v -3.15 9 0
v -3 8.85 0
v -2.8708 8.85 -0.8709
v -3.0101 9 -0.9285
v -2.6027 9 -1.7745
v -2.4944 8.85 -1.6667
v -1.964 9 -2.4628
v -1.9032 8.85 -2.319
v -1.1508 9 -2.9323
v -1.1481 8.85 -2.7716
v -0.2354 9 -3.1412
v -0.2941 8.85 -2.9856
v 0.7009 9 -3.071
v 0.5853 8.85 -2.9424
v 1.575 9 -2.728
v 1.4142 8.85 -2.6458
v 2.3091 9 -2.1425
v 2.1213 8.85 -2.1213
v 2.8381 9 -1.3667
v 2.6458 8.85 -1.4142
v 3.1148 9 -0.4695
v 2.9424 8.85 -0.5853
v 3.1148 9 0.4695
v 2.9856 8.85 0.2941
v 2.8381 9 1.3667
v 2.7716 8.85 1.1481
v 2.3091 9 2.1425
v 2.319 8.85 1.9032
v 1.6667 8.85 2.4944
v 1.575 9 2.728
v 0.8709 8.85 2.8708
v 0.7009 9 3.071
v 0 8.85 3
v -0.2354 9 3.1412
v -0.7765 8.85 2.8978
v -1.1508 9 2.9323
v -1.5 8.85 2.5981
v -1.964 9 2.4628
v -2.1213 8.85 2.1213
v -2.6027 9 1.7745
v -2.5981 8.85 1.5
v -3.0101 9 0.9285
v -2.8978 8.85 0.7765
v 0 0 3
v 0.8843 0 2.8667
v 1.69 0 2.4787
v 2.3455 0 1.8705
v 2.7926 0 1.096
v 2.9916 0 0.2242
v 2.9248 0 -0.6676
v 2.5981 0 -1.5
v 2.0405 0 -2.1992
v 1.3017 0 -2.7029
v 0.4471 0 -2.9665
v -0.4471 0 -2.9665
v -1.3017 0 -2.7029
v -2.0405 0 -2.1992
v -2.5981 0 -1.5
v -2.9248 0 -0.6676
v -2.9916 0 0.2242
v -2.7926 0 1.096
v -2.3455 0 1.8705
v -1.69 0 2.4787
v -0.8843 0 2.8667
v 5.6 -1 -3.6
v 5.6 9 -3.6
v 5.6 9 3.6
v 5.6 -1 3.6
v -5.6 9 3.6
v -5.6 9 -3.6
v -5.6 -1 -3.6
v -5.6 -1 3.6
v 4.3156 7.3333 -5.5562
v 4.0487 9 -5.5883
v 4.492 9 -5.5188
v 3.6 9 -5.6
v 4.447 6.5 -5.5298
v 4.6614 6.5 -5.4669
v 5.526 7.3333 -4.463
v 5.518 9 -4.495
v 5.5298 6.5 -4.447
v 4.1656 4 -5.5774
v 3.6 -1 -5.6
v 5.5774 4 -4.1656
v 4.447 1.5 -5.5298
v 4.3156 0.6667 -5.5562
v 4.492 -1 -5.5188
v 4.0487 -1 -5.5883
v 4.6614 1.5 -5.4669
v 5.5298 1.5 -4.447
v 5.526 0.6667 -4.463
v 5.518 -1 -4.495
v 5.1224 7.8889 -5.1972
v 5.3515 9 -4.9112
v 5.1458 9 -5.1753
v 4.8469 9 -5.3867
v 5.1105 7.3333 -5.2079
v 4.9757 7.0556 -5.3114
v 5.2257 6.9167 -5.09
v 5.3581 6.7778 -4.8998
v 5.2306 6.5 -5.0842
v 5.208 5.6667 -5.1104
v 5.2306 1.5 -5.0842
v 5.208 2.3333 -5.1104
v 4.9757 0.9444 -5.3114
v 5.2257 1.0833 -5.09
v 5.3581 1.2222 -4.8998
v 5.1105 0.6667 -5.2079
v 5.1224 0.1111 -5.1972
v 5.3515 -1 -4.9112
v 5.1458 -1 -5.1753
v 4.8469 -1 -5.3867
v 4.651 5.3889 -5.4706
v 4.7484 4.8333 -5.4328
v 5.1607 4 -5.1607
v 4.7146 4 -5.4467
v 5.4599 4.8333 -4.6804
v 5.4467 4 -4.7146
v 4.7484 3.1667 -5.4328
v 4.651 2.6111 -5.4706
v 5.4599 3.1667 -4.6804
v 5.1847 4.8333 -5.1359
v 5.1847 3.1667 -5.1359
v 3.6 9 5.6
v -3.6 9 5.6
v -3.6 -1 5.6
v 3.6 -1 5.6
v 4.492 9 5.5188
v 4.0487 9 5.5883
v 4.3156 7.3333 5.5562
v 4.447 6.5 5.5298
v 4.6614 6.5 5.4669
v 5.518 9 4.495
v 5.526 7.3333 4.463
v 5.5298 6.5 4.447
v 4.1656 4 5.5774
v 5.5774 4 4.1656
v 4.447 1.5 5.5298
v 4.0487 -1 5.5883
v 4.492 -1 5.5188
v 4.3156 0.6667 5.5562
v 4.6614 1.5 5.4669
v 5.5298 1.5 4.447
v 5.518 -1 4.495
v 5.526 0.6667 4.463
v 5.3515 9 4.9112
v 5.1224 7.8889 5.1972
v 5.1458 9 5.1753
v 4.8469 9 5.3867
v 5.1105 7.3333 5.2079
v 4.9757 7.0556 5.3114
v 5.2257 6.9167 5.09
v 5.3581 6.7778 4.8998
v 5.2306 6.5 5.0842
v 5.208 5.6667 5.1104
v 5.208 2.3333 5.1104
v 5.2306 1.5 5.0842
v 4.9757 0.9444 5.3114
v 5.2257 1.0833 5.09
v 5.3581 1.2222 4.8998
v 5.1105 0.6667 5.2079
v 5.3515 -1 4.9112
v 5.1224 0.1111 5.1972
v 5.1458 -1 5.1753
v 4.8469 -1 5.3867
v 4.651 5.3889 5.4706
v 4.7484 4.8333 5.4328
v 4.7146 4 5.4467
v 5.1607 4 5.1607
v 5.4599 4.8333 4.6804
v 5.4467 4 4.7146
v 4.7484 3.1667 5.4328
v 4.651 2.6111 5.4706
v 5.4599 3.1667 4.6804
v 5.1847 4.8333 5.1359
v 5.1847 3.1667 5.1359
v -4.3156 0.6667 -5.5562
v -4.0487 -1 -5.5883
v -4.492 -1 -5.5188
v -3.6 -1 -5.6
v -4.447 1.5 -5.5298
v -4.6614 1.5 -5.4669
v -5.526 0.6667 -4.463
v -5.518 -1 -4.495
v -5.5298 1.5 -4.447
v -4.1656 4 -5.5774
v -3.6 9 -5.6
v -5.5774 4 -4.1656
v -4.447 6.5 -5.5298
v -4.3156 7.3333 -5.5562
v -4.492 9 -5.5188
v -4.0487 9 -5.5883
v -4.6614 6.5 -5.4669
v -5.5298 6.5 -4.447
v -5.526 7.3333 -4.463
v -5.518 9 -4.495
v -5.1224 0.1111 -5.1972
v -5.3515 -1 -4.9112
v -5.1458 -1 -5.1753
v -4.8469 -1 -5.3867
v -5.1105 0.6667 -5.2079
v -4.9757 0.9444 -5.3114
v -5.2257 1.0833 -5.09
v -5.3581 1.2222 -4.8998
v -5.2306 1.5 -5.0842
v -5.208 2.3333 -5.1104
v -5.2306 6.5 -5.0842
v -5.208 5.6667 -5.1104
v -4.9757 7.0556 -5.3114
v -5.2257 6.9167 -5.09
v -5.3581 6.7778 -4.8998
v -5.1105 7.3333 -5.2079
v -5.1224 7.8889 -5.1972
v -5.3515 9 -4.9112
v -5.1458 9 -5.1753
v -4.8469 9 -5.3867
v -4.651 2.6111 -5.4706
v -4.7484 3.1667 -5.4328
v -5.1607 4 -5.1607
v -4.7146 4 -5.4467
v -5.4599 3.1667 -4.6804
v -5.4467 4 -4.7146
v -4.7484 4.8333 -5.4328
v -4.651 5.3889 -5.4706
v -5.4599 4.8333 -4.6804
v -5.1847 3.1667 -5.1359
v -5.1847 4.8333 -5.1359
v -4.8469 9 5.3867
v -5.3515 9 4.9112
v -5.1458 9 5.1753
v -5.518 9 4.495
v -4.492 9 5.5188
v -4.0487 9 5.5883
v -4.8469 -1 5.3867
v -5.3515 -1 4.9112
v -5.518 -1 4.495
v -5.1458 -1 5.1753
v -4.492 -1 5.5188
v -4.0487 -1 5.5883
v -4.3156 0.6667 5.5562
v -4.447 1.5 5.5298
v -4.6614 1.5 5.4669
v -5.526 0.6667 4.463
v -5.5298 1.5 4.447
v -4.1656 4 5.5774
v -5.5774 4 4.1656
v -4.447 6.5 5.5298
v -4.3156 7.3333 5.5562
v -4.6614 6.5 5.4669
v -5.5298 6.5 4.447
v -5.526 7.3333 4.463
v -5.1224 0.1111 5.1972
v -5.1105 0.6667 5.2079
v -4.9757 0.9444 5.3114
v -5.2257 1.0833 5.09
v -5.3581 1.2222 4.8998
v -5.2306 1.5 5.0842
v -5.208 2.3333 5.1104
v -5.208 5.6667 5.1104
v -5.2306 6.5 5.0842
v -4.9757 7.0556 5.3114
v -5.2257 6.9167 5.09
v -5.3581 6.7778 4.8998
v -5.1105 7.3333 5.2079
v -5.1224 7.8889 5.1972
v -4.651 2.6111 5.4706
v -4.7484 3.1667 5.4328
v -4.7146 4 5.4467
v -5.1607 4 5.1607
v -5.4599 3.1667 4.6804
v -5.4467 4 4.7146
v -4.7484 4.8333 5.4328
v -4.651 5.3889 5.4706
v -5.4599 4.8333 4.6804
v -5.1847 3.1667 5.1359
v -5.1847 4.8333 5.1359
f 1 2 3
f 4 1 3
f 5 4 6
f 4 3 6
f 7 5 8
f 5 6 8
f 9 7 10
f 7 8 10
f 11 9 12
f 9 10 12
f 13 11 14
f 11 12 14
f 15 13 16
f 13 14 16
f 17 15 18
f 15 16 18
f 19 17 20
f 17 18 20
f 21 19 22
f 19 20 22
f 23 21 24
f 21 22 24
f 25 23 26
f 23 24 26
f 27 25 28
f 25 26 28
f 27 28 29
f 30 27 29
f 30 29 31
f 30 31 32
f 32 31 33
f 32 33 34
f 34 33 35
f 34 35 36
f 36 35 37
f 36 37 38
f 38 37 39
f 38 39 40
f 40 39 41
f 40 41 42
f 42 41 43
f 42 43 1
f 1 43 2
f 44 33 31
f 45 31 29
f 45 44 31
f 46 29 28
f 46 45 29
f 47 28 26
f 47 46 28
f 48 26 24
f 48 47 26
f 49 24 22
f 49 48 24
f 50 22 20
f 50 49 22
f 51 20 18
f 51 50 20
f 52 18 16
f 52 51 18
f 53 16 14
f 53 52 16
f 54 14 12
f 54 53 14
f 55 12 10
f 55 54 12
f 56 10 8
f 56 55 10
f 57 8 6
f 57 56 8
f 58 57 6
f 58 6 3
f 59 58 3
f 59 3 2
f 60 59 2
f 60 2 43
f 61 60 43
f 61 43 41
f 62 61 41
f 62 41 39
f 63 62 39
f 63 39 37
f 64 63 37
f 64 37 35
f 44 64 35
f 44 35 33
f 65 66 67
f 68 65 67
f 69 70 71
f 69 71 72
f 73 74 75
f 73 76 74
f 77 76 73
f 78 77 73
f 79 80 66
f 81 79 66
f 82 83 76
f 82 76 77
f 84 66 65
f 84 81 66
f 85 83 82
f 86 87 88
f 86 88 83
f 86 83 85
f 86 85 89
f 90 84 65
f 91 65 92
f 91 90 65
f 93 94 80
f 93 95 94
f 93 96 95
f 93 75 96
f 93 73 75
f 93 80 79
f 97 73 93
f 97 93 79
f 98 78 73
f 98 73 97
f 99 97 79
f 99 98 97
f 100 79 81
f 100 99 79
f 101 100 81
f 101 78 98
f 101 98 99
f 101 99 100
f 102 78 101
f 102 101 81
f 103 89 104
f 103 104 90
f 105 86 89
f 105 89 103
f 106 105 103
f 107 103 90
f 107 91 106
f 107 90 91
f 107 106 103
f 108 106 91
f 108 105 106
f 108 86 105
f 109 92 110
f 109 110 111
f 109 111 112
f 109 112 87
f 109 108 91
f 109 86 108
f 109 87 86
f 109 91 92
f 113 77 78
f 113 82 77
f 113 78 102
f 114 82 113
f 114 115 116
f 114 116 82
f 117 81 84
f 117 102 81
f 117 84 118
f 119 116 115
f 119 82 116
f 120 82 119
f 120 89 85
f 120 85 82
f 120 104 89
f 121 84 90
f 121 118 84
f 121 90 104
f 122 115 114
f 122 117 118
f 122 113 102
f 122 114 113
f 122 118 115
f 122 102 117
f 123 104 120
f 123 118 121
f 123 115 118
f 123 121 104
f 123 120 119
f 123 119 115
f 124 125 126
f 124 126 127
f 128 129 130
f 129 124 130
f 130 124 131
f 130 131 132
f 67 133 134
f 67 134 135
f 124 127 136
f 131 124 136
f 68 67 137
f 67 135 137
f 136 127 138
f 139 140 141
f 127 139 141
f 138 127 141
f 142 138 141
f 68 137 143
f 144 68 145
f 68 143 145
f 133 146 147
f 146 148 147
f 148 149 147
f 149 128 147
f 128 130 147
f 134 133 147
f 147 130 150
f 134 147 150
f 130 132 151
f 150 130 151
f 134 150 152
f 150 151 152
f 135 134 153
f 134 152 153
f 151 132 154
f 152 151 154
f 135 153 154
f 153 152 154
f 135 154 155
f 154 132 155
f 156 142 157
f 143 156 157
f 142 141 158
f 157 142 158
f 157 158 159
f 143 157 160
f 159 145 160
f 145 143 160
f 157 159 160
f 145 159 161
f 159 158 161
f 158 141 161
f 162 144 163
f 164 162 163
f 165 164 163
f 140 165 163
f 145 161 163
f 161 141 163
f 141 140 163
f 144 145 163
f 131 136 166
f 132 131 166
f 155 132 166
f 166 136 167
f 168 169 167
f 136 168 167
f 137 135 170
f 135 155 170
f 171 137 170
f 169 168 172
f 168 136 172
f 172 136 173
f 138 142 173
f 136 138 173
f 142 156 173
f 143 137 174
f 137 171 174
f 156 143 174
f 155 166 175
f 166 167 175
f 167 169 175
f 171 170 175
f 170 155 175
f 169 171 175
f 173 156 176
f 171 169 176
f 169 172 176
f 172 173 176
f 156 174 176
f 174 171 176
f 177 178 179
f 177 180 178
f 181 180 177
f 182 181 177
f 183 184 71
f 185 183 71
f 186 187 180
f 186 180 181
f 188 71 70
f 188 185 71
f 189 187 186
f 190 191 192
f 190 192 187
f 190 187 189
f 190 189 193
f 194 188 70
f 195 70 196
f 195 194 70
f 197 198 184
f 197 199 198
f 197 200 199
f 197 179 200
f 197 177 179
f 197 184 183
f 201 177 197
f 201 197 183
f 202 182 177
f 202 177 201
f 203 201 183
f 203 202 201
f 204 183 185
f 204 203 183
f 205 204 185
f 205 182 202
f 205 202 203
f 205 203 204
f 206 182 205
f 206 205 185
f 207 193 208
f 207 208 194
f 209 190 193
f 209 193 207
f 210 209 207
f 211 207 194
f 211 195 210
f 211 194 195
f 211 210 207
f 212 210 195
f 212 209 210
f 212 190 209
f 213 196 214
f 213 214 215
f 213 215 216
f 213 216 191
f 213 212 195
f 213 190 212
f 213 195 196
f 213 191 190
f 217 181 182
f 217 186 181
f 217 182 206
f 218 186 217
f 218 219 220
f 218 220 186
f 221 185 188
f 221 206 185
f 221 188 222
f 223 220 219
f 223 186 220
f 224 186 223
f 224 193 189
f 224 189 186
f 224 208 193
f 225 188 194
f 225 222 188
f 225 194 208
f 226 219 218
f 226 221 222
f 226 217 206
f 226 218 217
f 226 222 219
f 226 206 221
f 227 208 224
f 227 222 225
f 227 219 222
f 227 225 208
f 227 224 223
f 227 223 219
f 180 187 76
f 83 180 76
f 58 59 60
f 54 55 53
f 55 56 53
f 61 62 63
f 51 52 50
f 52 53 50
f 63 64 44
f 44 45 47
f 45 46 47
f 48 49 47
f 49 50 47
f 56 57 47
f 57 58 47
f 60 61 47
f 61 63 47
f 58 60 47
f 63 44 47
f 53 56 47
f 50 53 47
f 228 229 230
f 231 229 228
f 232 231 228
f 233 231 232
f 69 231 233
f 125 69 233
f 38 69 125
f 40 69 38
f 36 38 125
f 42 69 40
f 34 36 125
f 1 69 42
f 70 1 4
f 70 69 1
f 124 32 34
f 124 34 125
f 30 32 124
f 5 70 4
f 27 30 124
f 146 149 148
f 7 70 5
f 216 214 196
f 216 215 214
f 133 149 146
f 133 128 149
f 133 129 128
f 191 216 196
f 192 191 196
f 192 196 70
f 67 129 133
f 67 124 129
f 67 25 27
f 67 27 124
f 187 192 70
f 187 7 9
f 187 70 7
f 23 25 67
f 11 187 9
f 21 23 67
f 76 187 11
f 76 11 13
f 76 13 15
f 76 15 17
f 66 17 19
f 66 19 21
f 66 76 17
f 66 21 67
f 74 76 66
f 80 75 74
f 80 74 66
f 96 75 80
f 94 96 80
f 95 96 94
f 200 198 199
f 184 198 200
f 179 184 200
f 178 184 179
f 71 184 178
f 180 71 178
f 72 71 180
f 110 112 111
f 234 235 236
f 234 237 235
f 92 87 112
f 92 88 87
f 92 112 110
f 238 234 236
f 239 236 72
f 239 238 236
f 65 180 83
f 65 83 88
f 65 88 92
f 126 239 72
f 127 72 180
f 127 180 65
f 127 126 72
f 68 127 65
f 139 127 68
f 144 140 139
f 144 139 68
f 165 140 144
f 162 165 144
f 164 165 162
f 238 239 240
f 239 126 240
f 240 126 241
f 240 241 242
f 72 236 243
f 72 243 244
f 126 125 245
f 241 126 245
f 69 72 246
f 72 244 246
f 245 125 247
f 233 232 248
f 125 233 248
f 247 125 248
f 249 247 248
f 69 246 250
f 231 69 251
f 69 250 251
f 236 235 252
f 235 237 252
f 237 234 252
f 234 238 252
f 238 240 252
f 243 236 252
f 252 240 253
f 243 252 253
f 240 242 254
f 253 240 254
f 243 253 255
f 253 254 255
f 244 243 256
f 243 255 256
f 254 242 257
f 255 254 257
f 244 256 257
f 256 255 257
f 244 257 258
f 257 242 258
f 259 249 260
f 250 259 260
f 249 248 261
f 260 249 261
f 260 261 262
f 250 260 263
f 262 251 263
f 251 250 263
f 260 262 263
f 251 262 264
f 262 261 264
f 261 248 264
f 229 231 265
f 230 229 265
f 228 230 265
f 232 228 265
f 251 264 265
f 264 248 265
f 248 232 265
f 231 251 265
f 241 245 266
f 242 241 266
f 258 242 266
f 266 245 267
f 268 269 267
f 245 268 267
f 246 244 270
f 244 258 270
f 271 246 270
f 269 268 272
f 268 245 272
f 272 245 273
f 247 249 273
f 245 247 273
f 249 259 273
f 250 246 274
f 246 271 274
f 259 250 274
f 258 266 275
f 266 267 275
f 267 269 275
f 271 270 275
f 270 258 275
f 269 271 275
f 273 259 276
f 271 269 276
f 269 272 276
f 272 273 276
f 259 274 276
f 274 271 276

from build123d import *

# Parameters (mm, degrees)
SKETCH2_W                                       = 11.2
SKETCH2_H                                       = 11.2
SKETCH2_R                                       = 3
BOSS_EXTRUDE1_DEPTH                             = 9
SKETCH3_W                                       = 11.2
SKETCH3_H                                       = 11.2
BOSS_EXTRUDE2_DEPTH                             = 1
FILLET1_SIZE                                    = 2
CSK_FOR_M3_FLAT_HEAD_MACHINE_SCREW1_D           = 3.4
CSK_FOR_M3_FLAT_HEAD_MACHINE_SCREW1_DEPTH       = 9
CSK_FOR_M3_FLAT_HEAD_MACHINE_SCREW1_CSINK_D     = 6.3
CSK_FOR_M3_FLAT_HEAD_MACHINE_SCREW1_CSINK_ANGLE = 90


with BuildPart() as part:
    # Sketch2 → Boss-Extrude1 (new body)
    with BuildSketch(Plane(origin=(0, 0, 0), x_dir=(1, 0, 0), z_dir=(0, 1, 0))):
        Rectangle(SKETCH2_W, SKETCH2_H)
        with Locations(Location((0, 0, 0), (0, 0, 270))):
            Circle(SKETCH2_R, mode=Mode.SUBTRACT)
    extrude(amount=BOSS_EXTRUDE1_DEPTH)

    # Sketch3 → Boss-Extrude2 (add)
    with BuildSketch(Plane.XZ):
        Rectangle(SKETCH3_W, SKETCH3_H)
    extrude(amount=BOSS_EXTRUDE2_DEPTH)

    # Fillet1
    # a fillet whose section is not a circle: 2 mm, written as the material it takes off along each edge
    with BuildSketch(Plane(origin=(5.6, -6, 5.6), x_dir=(-1, 0, 0), z_dir=(0, 1, 0)), Plane(origin=(-5.6, 14, 5.6), x_dir=(1, 0, 0), z_dir=(0, -1, 0))) as fillet1_piece_1:
        with BuildLine():
            add(Edge.make_bspline([(FILLET1_SIZE, 0), (FILLET1_SIZE * 0.831801948466, 0), (FILLET1_SIZE * 0.663603896932, 0), (FILLET1_SIZE * 0.292893218813, -FILLET1_SIZE * 0.0716919198361), (FILLET1_SIZE * 0.0716919198361, -FILLET1_SIZE * 0.292893218813), (0, -FILLET1_SIZE * 0.663603896932), (0, -FILLET1_SIZE * 0.831801948466), (0, -FILLET1_SIZE)], knots=[0, 0, 0, 0, 0, 0, 0.5, 0.5, 1, 1, 1, 1, 1, 1], degree=5))
            Line((0, -FILLET1_SIZE), (0, 0))
            Line((0, 0), (FILLET1_SIZE, 0))
        make_face()
    extrude(amount=20, mode=Mode.SUBTRACT)
    with BuildSketch(Plane(origin=(-5.6, 14, -5.6), x_dir=(1, 0, 0), z_dir=(0, -1, 0)), Plane(origin=(5.6, -6, -5.6), x_dir=(-1, 0, 0), z_dir=(0, 1, 0))) as fillet1_piece_2:
        with BuildLine():
            add(Edge.make_bspline([(FILLET1_SIZE, 0), (FILLET1_SIZE * 0.831801948466, 0), (FILLET1_SIZE * 0.663603896932, 0), (FILLET1_SIZE * 0.292893218813, FILLET1_SIZE * 0.0716919198361), (FILLET1_SIZE * 0.0716919198361, FILLET1_SIZE * 0.292893218813), (0, FILLET1_SIZE * 0.663603896932), (0, FILLET1_SIZE * 0.831801948466), (0, FILLET1_SIZE)], knots=[0, 0, 0, 0, 0, 0, 0.5, 0.5, 1, 1, 1, 1, 1, 1], degree=5))
            Line((0, FILLET1_SIZE), (0, 0))
            Line((0, 0), (FILLET1_SIZE, 0))
        make_face()
    extrude(amount=20, mode=Mode.SUBTRACT)

    # CSK for M3 Flat Head Machine Screw1
    with Locations(Plane(origin=(0, 9, 0), x_dir=(1, 0, 0), z_dir=(0, 1, 0))):
        with Locations((0, 0)):
            CounterSinkHole(CSK_FOR_M3_FLAT_HEAD_MACHINE_SCREW1_D / 2, CSK_FOR_M3_FLAT_HEAD_MACHINE_SCREW1_CSINK_D / 2, depth=CSK_FOR_M3_FLAT_HEAD_MACHINE_SCREW1_DEPTH, counter_sink_angle=CSK_FOR_M3_FLAT_HEAD_MACHINE_SCREW1_CSINK_ANGLE)


solid = part.part
